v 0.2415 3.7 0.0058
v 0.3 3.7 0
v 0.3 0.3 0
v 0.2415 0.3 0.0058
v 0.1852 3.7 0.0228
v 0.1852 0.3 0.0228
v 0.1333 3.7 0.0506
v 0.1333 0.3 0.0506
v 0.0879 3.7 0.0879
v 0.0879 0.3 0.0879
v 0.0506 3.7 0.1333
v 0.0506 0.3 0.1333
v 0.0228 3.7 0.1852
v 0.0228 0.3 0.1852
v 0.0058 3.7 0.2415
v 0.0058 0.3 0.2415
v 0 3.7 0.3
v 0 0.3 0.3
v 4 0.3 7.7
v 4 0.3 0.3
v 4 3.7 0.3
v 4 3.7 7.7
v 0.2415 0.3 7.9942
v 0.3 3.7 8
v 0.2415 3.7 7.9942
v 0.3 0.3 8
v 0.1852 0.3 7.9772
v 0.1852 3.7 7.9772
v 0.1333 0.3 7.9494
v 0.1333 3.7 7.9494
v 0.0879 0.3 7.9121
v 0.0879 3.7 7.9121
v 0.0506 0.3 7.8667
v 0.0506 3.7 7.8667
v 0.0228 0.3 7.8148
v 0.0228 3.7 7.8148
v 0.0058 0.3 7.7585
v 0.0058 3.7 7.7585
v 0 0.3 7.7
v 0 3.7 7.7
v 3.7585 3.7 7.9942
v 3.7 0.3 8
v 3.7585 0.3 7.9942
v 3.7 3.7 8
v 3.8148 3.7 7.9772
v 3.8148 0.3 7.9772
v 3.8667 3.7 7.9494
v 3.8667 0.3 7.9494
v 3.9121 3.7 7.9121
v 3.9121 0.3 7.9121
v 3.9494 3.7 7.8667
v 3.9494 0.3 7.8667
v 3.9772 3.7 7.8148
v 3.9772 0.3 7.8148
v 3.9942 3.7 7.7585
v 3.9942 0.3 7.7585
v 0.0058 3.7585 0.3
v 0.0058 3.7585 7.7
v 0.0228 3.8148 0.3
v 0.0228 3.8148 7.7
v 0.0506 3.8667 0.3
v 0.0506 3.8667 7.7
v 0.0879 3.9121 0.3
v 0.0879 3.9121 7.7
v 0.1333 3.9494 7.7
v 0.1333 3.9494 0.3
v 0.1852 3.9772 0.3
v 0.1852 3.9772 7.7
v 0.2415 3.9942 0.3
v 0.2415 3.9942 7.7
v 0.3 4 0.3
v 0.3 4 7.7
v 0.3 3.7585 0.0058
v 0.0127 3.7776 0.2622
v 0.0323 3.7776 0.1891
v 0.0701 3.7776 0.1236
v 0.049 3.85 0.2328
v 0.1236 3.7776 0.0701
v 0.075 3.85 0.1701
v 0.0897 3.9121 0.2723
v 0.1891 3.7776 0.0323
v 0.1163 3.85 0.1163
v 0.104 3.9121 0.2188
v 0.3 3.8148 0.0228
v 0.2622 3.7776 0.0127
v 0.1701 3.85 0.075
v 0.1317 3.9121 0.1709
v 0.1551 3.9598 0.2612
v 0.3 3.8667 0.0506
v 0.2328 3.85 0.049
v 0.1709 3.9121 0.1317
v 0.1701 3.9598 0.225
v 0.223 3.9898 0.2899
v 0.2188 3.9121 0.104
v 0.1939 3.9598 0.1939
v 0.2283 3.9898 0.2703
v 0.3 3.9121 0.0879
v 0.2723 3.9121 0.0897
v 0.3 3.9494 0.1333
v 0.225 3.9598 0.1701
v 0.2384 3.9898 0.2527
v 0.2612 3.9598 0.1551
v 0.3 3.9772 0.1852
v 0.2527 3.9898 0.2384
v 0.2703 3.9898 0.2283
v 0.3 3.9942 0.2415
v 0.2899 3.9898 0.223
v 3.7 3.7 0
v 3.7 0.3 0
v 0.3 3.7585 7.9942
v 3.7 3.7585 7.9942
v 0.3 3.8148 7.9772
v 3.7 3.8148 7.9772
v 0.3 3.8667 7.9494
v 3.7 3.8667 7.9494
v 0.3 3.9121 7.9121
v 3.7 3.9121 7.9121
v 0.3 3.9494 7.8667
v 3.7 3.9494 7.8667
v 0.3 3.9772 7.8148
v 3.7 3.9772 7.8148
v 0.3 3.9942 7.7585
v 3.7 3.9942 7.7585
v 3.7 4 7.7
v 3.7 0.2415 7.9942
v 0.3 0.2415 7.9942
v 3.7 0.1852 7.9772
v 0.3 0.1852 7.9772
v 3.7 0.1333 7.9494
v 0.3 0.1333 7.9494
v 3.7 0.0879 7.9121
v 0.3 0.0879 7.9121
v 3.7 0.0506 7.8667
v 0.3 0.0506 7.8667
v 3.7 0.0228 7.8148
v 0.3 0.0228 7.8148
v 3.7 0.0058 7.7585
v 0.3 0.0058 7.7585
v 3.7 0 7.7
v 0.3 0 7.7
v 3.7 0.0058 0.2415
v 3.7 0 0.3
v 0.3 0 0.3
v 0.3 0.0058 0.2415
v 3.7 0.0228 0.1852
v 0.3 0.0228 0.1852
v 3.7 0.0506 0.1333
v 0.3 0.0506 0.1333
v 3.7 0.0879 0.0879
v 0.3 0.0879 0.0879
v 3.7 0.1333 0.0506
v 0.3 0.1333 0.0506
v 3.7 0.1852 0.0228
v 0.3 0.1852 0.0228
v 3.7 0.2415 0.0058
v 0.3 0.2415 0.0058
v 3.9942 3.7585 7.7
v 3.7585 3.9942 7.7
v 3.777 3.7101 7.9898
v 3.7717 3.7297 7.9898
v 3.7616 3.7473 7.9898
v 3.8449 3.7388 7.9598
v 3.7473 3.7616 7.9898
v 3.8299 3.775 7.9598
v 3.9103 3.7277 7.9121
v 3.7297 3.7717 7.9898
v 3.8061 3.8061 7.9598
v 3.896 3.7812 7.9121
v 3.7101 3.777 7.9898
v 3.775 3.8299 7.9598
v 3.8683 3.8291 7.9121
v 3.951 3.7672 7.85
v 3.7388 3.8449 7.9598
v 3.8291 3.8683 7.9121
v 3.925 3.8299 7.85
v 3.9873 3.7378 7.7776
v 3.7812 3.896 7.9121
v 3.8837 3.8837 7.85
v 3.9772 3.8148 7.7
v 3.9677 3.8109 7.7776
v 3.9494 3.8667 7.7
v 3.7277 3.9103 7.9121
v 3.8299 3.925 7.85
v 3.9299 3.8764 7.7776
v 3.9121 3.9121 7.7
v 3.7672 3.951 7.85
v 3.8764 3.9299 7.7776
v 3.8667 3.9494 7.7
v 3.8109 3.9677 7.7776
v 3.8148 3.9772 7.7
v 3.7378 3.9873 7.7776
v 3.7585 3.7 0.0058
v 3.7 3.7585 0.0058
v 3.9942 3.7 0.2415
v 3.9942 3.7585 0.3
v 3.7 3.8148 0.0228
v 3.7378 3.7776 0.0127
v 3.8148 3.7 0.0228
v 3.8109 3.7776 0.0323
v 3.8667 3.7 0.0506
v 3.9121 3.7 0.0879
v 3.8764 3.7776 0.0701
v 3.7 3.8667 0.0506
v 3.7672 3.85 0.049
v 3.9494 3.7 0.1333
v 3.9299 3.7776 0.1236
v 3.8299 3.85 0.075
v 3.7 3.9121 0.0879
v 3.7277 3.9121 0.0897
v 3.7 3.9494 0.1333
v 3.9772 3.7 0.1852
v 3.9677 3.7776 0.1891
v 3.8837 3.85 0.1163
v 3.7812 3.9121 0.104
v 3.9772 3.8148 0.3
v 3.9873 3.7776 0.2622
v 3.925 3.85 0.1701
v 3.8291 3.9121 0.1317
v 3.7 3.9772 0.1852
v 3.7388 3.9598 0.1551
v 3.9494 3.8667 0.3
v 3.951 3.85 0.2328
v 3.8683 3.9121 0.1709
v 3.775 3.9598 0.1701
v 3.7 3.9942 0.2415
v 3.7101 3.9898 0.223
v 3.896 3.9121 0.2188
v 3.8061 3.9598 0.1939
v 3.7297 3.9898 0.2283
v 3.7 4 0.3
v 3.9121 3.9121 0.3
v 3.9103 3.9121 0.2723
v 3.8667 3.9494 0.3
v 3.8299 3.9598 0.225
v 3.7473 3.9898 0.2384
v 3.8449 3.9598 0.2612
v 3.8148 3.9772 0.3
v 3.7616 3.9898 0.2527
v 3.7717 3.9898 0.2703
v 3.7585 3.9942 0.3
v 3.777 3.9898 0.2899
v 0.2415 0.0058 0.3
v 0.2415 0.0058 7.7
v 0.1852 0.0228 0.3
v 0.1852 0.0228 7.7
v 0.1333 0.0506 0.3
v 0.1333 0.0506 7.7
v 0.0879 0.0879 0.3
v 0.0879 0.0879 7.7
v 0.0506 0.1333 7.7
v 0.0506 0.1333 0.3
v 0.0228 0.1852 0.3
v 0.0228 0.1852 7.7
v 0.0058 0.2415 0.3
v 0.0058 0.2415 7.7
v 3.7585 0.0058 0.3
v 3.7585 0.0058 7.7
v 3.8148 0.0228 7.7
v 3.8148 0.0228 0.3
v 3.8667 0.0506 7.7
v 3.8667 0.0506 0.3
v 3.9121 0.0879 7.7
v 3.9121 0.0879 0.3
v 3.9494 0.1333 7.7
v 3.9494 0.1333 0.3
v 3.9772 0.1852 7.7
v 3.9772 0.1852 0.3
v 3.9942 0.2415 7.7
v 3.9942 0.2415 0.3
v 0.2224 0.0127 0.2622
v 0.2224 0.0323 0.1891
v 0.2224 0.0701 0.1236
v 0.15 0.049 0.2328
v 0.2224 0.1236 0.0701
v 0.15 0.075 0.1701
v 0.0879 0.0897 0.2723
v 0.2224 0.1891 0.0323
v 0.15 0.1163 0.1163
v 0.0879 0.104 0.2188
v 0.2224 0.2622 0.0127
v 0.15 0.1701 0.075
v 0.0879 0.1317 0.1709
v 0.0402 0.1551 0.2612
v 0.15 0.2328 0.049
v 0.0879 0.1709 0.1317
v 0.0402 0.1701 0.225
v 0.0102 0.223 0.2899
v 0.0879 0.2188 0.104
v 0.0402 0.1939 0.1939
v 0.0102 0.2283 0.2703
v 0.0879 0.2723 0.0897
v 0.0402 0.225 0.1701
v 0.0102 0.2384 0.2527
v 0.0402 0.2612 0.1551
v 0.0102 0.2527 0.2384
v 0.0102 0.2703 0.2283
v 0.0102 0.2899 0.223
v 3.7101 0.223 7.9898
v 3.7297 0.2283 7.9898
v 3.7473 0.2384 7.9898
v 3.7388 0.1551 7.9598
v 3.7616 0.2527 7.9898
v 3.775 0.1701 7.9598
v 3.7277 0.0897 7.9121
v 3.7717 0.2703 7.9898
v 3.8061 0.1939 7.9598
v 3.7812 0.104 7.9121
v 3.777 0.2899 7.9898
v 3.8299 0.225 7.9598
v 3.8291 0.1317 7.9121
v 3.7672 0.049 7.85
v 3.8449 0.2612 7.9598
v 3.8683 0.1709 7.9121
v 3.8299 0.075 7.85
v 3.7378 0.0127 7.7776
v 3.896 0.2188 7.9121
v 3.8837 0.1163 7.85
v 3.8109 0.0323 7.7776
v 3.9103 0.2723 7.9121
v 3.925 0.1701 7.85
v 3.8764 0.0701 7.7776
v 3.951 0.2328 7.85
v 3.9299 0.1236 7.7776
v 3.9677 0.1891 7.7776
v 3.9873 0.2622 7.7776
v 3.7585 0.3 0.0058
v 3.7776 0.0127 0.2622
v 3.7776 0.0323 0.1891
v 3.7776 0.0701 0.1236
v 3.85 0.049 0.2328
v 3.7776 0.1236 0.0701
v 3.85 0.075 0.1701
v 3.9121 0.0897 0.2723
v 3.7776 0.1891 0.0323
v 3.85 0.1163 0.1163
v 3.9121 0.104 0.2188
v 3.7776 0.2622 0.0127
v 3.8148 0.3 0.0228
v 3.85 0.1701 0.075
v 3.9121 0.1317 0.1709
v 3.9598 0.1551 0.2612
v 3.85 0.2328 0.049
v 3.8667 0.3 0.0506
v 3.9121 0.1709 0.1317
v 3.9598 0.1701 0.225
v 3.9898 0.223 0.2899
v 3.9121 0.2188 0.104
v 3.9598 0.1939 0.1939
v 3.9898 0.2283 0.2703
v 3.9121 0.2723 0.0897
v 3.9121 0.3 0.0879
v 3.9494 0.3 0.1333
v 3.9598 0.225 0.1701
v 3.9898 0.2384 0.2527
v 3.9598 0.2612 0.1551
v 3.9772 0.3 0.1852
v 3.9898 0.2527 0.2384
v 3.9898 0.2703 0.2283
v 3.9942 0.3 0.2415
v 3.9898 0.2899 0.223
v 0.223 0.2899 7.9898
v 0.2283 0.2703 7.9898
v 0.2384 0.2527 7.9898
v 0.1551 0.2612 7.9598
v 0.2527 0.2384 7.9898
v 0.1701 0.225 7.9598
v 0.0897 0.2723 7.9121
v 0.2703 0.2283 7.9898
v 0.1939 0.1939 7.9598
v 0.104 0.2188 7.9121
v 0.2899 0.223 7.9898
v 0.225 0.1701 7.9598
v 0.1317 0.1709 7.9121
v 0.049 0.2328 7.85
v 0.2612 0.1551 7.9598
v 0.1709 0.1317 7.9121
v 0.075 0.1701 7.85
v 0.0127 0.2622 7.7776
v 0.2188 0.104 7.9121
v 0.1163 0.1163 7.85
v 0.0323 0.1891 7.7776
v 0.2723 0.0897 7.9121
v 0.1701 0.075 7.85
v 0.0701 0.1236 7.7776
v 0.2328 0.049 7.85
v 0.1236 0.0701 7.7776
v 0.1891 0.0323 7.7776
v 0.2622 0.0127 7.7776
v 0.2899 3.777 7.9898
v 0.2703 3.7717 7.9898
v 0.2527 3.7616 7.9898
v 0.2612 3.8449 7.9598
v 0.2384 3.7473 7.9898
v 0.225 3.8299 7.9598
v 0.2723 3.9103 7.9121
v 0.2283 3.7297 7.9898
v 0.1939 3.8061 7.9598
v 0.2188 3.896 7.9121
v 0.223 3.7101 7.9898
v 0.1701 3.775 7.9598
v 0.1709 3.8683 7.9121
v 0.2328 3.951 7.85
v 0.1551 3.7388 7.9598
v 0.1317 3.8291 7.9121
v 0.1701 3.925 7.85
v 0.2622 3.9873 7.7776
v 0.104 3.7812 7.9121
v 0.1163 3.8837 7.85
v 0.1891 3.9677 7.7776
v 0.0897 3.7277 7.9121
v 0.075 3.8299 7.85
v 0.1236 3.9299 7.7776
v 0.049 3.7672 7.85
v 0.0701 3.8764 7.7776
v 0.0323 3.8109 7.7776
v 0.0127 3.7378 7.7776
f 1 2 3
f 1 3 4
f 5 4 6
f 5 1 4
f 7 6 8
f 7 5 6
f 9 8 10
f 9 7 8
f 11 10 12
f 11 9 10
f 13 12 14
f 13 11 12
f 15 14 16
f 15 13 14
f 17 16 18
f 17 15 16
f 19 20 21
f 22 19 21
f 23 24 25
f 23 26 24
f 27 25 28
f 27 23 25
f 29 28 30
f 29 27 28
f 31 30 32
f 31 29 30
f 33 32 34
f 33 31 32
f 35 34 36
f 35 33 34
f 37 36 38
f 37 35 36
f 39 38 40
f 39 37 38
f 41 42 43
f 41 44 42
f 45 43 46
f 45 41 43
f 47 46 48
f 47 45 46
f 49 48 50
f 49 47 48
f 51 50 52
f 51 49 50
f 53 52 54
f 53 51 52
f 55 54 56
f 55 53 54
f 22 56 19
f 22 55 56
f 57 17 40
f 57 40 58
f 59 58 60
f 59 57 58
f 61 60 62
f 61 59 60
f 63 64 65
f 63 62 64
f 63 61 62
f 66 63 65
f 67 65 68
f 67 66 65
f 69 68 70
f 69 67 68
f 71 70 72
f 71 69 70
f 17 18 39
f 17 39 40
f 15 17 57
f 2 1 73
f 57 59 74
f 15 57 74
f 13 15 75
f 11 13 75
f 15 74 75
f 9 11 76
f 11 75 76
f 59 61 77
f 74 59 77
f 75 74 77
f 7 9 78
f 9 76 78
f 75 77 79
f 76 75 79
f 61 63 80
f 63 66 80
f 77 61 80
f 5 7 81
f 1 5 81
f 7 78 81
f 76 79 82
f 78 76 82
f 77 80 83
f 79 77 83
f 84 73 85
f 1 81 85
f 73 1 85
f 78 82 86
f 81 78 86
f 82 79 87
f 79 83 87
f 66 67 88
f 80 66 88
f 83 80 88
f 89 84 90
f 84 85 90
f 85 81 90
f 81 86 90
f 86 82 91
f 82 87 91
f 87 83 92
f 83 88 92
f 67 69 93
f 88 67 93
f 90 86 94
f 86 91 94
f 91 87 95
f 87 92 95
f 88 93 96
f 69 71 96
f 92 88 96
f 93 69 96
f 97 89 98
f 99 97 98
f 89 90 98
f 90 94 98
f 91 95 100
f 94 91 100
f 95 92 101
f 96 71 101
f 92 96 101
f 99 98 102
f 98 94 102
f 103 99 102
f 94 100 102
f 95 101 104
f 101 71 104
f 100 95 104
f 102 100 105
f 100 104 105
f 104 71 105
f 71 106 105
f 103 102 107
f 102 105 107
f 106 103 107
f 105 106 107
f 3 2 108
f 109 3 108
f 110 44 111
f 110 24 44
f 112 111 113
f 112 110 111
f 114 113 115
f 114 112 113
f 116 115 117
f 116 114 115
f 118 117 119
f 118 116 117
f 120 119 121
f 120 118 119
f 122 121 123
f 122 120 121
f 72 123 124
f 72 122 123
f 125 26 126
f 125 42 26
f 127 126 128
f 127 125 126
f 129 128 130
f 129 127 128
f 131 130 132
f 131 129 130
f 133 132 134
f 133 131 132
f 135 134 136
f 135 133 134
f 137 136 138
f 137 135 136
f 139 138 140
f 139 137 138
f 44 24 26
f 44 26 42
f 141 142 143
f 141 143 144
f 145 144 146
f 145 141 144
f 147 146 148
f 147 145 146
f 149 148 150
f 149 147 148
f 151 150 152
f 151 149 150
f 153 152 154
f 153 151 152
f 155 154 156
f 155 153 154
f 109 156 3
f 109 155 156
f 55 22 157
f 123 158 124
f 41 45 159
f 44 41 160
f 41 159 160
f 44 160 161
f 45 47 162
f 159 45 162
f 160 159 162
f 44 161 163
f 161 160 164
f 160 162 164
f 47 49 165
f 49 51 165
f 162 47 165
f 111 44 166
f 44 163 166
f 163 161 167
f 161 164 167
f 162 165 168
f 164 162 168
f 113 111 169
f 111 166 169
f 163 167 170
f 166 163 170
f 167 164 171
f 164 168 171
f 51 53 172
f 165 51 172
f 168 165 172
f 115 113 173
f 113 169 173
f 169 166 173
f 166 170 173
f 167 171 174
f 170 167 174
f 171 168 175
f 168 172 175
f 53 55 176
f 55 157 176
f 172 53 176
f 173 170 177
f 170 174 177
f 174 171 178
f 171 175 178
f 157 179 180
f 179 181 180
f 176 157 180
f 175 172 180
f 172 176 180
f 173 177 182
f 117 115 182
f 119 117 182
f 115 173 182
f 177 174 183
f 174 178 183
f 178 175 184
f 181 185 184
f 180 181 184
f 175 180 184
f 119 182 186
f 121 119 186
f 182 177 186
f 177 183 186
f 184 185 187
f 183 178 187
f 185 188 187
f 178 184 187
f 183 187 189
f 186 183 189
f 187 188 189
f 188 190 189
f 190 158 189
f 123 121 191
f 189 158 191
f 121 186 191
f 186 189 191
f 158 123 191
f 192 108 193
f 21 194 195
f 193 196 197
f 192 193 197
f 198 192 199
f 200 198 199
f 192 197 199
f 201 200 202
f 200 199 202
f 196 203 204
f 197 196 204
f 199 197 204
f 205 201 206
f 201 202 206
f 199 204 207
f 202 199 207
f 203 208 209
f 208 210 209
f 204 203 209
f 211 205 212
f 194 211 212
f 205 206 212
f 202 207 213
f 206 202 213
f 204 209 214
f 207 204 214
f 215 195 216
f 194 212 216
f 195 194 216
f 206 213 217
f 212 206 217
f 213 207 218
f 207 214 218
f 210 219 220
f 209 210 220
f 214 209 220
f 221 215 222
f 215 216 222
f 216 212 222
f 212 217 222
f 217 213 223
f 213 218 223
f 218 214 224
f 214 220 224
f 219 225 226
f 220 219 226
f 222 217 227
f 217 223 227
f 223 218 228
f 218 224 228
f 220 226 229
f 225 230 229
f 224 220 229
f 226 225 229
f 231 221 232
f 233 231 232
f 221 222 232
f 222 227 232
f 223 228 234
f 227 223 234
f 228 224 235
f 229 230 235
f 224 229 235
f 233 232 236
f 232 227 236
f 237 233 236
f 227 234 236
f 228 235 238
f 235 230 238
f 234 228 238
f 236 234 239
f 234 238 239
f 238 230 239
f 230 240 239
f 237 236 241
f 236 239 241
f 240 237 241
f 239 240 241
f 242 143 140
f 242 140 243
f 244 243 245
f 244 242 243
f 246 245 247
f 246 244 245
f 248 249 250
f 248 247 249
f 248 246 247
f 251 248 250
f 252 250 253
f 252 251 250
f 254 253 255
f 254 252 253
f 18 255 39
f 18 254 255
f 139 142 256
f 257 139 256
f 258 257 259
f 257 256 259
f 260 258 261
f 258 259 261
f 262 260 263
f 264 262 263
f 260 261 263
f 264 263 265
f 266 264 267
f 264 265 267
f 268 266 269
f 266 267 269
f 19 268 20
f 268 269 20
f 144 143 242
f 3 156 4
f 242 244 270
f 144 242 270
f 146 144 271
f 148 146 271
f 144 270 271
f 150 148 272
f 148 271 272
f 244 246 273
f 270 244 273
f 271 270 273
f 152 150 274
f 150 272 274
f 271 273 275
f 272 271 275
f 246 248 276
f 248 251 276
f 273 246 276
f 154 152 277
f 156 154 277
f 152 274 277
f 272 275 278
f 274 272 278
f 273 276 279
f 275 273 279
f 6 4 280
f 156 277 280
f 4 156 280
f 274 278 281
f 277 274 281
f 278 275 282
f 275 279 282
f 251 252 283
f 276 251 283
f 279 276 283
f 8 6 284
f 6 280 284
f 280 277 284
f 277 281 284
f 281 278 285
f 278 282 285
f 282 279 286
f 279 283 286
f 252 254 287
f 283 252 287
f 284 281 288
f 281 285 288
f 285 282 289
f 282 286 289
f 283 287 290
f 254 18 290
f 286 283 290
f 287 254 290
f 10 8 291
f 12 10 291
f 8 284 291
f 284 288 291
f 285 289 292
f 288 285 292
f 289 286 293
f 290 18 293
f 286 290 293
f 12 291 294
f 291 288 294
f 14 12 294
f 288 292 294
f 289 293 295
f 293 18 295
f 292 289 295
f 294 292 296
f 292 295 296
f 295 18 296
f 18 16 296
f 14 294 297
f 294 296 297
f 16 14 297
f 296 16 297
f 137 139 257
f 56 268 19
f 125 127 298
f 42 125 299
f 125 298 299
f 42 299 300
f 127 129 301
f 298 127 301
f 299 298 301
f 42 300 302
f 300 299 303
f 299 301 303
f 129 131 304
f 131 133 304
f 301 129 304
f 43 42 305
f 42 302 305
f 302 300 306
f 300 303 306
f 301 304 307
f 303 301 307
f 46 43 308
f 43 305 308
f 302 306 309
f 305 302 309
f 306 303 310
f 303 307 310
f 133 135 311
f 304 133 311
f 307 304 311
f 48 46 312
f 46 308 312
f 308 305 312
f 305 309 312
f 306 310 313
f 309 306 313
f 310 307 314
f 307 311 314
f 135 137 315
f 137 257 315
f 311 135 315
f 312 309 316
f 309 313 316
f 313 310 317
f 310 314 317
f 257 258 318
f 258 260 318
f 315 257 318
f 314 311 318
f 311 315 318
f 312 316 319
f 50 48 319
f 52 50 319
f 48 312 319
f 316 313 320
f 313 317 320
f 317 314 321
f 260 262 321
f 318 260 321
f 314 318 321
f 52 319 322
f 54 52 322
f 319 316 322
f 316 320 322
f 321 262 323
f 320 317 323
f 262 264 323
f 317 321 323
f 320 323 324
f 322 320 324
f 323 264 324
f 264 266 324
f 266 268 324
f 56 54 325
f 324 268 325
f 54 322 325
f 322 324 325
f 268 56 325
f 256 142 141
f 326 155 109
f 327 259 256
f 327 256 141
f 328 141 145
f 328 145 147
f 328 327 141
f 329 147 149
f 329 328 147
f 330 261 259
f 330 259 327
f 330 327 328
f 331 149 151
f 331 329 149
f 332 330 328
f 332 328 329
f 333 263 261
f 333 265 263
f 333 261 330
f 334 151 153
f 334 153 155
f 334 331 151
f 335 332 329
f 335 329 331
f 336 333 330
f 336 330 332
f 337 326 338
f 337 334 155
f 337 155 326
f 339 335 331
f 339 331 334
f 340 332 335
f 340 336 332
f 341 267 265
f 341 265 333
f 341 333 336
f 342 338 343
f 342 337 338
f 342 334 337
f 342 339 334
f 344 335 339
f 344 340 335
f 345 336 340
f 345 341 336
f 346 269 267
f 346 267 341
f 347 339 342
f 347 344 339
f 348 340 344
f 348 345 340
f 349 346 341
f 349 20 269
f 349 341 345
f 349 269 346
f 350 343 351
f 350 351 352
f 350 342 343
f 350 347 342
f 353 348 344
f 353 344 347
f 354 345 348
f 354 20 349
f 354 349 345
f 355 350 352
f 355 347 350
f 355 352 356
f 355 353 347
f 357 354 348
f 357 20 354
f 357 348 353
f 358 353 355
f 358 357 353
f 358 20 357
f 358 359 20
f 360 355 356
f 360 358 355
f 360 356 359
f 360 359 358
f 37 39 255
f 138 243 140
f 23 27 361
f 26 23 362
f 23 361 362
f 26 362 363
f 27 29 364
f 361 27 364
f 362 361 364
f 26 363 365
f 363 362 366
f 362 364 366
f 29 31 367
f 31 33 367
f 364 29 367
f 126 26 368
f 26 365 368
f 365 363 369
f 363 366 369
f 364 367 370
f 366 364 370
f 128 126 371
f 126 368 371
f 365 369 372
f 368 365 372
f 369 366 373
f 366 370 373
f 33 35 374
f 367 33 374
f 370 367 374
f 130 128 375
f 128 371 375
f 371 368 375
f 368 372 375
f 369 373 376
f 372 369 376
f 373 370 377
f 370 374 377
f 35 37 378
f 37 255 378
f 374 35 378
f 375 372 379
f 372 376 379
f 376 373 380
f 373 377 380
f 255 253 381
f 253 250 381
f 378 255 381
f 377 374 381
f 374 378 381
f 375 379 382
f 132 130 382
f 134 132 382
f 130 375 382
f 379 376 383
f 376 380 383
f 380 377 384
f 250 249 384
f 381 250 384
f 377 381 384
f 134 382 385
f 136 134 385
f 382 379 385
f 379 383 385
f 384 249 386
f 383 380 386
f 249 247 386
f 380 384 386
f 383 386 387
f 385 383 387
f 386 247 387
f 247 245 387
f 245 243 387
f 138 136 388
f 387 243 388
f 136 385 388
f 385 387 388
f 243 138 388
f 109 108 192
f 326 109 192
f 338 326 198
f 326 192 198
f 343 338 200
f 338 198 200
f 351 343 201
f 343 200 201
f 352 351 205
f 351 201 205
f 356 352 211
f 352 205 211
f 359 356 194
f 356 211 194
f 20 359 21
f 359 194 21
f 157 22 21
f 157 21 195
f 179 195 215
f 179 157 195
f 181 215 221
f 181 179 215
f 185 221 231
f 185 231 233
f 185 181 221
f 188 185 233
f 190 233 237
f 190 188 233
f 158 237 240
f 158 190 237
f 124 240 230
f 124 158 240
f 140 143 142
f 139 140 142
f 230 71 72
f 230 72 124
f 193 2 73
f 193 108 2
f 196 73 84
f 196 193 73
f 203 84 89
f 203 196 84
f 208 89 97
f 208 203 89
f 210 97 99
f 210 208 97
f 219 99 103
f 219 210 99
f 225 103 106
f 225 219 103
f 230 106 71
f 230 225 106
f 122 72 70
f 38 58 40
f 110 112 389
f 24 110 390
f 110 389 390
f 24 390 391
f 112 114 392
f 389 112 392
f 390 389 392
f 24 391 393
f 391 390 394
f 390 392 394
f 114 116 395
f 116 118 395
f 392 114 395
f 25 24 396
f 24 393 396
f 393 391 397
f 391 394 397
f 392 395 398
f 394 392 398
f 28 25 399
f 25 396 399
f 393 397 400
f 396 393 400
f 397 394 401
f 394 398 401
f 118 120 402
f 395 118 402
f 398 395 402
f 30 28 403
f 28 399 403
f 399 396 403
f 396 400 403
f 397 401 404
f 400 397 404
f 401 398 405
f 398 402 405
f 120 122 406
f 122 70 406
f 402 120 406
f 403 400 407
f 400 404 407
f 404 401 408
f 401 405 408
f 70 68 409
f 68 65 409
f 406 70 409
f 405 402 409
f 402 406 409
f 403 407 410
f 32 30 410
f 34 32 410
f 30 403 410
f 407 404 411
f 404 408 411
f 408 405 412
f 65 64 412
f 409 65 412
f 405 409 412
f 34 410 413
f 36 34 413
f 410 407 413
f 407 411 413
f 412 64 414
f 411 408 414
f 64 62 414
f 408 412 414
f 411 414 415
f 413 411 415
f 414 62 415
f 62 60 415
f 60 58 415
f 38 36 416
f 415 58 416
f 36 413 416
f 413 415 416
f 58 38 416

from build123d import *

# Parameters (mm, degrees)
SKETCH_1_W      = 4
SKETCH_1_H      = 4
EXTRUDE_1_DEPTH = 8
FILLET_2_R      = 0.3
FILLET_3_R      = 0.3
FILLET_4_R      = 0.3
FILLET_5_R      = 0.3
FILLET_6_R      = 0.3


with BuildPart() as part:
    # 草图1 → 凸台-拉伸1 (new body)
    with BuildSketch(Plane.XY):
        with Locations((2, 2)):
            Rectangle(SKETCH_1_W, SKETCH_1_H)
    extrude(amount=EXTRUDE_1_DEPTH)

    # 圆角2
    fillet_2_edges = [part.edges().sort_by_distance(p)[0] for p in [
        (2, 0, 0),
    ]]
    fillet(fillet_2_edges, radius=FILLET_2_R)

    # 圆角3
    fillet_3_edges = [part.edges().sort_by_distance(p)[0] for p in [
        (4, 2.15, 0),
        (4, 0.087867966, 0.087867966),
        (4, 0, 4.15),
    ]]
    fillet(fillet_3_edges, radius=FILLET_3_R)

    # 圆角4
    fillet_4_edges = [part.edges().sort_by_distance(p)[0] for p in [
        (0, 0.087867966, 0.087867966),
        (0, 2.15, 0),
        (0, 0, 4.15),
    ]]
    fillet(fillet_4_edges, radius=FILLET_4_R)

    # 圆角5
    fillet_5_edges = [part.edges().sort_by_distance(p)[0] for p in [
        (2, 4, 0),
        (3.912132034, 4, 0.087867966),
        (0.087867966, 4, 0.087867966),
        (0, 4, 4.15),
        (4, 4, 4.15),
    ]]
    fillet(fillet_5_edges, radius=FILLET_5_R)

    # 圆角6
    fillet_6_edges = [part.edges().sort_by_distance(p)[0] for p in [
        (4, 2, 8),
        (3.912132034, 0.087867966, 8),
        (2, 0, 8),
        (0.087867966, 0.087867966, 8),
        (2, 4, 8),
        (0, 2, 8),
        (0.087867966, 3.912132034, 8),
        (3.912132034, 3.912132034, 8),
    ]]
    fillet(fillet_6_edges, radius=FILLET_6_R)


solid = part.part
